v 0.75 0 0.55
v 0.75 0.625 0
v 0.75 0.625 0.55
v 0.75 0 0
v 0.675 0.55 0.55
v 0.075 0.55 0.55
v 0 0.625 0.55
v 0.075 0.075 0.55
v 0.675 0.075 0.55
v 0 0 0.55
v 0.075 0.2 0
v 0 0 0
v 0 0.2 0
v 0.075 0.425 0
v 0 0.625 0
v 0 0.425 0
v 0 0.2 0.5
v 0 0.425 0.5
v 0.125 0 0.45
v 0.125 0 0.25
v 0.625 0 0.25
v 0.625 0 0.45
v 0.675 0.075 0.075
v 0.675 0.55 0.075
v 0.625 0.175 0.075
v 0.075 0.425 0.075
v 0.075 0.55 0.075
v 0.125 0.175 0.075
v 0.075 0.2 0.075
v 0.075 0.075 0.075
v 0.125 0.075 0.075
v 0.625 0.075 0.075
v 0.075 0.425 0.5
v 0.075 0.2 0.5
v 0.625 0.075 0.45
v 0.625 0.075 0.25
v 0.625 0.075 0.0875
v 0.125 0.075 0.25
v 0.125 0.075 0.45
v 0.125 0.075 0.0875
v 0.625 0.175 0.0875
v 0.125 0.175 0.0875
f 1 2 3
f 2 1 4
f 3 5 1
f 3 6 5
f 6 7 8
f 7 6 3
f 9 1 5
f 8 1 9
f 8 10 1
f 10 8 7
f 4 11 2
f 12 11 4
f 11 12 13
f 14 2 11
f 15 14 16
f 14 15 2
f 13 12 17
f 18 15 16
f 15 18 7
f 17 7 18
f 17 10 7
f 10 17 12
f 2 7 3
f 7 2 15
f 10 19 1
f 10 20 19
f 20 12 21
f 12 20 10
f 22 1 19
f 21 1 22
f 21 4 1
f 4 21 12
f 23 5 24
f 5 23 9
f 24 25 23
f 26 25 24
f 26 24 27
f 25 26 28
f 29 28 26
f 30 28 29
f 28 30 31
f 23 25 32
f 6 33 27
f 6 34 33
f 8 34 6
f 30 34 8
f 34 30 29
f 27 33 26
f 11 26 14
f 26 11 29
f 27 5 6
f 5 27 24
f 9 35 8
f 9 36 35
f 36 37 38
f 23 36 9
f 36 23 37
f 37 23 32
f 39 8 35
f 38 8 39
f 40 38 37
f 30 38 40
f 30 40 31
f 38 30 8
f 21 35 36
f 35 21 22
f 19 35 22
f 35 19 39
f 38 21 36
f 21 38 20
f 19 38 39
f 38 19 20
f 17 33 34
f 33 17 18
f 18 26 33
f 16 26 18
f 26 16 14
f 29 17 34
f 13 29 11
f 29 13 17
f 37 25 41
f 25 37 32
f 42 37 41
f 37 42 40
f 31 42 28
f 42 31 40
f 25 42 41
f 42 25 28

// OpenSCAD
// === Parameters ===

// Outer enclosure dimensions
outer_length = 0.75;       // X dimension
outer_width  = 0.625;      // Y dimension
outer_height = 0.55;       // Z dimension

// Wall / floor thickness (shared by all sides)
wall_t = 0.075;

// Front wall cut: horizontal rectangular notch in front face
front_cut_len     = 0.5;    // X span of cut
front_cut_margin  = 0.125;  // X margin each side
front_cut_depth   = 0.075;  // Y depth inward from front face
front_cut_z_lo    = 0.25;   // Z lower bound
front_cut_z_hi    = 0.45;   // Z upper bound

// Left side opening: vertical rectangular notch in left face
left_cut_depth    = 0.075;  // X depth inward from left face
left_cut_span     = 0.225;  // Y span along side wall
left_cut_y_margin = 0.2;    // Y margin front and back
left_cut_z_hi     = 0.5;    // Z upper bound (starts at 0)

// Internal ledge along front inside region
ledge_len      = 0.5;       // X span
ledge_width    = 0.1;       // Y depth into interior
ledge_thick    = 0.0125;    // Z thickness (shallow tier)
ledge_x_margin = 0.125;     // X margin each side

// Tolerance for clean boolean cuts
eps = 0.001;

// === Modules ===

// Outer shell with inner void (open-top box)
module hollow_box() {
    difference() {
        // Solid outer body
        cube([outer_length, outer_width, outer_height]);

        // Rectangular inner void – extends past top for open-top effect
        translate([wall_t, wall_t, wall_t])
            cube([outer_length - 2 * wall_t,
                  outer_width  - 2 * wall_t,
                  outer_height - wall_t + eps]);
    }
}

// Front wall cut (centered horizontally, partial height band)
module front_wall_cut() {
    translate([front_cut_margin, -eps, front_cut_z_lo])
        cube([front_cut_len,
              front_cut_depth + eps,
              front_cut_z_hi - front_cut_z_lo]);
}

// Left side opening (partial along Y, from base up to left_cut_z_hi)
module left_side_opening() {
    translate([-eps, left_cut_y_margin, 0])
        cube([left_cut_depth + eps,
              left_cut_span,
              left_cut_z_hi]);
}

// Thin internal ledge on floor near front inner wall
module front_ledge() {
    translate([ledge_x_margin, wall_t, wall_t])
        cube([ledge_len, ledge_width, ledge_thick]);
}

// === Main Assembly ===

union() {
    // Hollow enclosure with wall cuts subtracted
    difference() {
        hollow_box();
        front_wall_cut();
        left_side_opening();
    }

    // Add thin ledge on interior floor along front region
    front_ledge();
}
